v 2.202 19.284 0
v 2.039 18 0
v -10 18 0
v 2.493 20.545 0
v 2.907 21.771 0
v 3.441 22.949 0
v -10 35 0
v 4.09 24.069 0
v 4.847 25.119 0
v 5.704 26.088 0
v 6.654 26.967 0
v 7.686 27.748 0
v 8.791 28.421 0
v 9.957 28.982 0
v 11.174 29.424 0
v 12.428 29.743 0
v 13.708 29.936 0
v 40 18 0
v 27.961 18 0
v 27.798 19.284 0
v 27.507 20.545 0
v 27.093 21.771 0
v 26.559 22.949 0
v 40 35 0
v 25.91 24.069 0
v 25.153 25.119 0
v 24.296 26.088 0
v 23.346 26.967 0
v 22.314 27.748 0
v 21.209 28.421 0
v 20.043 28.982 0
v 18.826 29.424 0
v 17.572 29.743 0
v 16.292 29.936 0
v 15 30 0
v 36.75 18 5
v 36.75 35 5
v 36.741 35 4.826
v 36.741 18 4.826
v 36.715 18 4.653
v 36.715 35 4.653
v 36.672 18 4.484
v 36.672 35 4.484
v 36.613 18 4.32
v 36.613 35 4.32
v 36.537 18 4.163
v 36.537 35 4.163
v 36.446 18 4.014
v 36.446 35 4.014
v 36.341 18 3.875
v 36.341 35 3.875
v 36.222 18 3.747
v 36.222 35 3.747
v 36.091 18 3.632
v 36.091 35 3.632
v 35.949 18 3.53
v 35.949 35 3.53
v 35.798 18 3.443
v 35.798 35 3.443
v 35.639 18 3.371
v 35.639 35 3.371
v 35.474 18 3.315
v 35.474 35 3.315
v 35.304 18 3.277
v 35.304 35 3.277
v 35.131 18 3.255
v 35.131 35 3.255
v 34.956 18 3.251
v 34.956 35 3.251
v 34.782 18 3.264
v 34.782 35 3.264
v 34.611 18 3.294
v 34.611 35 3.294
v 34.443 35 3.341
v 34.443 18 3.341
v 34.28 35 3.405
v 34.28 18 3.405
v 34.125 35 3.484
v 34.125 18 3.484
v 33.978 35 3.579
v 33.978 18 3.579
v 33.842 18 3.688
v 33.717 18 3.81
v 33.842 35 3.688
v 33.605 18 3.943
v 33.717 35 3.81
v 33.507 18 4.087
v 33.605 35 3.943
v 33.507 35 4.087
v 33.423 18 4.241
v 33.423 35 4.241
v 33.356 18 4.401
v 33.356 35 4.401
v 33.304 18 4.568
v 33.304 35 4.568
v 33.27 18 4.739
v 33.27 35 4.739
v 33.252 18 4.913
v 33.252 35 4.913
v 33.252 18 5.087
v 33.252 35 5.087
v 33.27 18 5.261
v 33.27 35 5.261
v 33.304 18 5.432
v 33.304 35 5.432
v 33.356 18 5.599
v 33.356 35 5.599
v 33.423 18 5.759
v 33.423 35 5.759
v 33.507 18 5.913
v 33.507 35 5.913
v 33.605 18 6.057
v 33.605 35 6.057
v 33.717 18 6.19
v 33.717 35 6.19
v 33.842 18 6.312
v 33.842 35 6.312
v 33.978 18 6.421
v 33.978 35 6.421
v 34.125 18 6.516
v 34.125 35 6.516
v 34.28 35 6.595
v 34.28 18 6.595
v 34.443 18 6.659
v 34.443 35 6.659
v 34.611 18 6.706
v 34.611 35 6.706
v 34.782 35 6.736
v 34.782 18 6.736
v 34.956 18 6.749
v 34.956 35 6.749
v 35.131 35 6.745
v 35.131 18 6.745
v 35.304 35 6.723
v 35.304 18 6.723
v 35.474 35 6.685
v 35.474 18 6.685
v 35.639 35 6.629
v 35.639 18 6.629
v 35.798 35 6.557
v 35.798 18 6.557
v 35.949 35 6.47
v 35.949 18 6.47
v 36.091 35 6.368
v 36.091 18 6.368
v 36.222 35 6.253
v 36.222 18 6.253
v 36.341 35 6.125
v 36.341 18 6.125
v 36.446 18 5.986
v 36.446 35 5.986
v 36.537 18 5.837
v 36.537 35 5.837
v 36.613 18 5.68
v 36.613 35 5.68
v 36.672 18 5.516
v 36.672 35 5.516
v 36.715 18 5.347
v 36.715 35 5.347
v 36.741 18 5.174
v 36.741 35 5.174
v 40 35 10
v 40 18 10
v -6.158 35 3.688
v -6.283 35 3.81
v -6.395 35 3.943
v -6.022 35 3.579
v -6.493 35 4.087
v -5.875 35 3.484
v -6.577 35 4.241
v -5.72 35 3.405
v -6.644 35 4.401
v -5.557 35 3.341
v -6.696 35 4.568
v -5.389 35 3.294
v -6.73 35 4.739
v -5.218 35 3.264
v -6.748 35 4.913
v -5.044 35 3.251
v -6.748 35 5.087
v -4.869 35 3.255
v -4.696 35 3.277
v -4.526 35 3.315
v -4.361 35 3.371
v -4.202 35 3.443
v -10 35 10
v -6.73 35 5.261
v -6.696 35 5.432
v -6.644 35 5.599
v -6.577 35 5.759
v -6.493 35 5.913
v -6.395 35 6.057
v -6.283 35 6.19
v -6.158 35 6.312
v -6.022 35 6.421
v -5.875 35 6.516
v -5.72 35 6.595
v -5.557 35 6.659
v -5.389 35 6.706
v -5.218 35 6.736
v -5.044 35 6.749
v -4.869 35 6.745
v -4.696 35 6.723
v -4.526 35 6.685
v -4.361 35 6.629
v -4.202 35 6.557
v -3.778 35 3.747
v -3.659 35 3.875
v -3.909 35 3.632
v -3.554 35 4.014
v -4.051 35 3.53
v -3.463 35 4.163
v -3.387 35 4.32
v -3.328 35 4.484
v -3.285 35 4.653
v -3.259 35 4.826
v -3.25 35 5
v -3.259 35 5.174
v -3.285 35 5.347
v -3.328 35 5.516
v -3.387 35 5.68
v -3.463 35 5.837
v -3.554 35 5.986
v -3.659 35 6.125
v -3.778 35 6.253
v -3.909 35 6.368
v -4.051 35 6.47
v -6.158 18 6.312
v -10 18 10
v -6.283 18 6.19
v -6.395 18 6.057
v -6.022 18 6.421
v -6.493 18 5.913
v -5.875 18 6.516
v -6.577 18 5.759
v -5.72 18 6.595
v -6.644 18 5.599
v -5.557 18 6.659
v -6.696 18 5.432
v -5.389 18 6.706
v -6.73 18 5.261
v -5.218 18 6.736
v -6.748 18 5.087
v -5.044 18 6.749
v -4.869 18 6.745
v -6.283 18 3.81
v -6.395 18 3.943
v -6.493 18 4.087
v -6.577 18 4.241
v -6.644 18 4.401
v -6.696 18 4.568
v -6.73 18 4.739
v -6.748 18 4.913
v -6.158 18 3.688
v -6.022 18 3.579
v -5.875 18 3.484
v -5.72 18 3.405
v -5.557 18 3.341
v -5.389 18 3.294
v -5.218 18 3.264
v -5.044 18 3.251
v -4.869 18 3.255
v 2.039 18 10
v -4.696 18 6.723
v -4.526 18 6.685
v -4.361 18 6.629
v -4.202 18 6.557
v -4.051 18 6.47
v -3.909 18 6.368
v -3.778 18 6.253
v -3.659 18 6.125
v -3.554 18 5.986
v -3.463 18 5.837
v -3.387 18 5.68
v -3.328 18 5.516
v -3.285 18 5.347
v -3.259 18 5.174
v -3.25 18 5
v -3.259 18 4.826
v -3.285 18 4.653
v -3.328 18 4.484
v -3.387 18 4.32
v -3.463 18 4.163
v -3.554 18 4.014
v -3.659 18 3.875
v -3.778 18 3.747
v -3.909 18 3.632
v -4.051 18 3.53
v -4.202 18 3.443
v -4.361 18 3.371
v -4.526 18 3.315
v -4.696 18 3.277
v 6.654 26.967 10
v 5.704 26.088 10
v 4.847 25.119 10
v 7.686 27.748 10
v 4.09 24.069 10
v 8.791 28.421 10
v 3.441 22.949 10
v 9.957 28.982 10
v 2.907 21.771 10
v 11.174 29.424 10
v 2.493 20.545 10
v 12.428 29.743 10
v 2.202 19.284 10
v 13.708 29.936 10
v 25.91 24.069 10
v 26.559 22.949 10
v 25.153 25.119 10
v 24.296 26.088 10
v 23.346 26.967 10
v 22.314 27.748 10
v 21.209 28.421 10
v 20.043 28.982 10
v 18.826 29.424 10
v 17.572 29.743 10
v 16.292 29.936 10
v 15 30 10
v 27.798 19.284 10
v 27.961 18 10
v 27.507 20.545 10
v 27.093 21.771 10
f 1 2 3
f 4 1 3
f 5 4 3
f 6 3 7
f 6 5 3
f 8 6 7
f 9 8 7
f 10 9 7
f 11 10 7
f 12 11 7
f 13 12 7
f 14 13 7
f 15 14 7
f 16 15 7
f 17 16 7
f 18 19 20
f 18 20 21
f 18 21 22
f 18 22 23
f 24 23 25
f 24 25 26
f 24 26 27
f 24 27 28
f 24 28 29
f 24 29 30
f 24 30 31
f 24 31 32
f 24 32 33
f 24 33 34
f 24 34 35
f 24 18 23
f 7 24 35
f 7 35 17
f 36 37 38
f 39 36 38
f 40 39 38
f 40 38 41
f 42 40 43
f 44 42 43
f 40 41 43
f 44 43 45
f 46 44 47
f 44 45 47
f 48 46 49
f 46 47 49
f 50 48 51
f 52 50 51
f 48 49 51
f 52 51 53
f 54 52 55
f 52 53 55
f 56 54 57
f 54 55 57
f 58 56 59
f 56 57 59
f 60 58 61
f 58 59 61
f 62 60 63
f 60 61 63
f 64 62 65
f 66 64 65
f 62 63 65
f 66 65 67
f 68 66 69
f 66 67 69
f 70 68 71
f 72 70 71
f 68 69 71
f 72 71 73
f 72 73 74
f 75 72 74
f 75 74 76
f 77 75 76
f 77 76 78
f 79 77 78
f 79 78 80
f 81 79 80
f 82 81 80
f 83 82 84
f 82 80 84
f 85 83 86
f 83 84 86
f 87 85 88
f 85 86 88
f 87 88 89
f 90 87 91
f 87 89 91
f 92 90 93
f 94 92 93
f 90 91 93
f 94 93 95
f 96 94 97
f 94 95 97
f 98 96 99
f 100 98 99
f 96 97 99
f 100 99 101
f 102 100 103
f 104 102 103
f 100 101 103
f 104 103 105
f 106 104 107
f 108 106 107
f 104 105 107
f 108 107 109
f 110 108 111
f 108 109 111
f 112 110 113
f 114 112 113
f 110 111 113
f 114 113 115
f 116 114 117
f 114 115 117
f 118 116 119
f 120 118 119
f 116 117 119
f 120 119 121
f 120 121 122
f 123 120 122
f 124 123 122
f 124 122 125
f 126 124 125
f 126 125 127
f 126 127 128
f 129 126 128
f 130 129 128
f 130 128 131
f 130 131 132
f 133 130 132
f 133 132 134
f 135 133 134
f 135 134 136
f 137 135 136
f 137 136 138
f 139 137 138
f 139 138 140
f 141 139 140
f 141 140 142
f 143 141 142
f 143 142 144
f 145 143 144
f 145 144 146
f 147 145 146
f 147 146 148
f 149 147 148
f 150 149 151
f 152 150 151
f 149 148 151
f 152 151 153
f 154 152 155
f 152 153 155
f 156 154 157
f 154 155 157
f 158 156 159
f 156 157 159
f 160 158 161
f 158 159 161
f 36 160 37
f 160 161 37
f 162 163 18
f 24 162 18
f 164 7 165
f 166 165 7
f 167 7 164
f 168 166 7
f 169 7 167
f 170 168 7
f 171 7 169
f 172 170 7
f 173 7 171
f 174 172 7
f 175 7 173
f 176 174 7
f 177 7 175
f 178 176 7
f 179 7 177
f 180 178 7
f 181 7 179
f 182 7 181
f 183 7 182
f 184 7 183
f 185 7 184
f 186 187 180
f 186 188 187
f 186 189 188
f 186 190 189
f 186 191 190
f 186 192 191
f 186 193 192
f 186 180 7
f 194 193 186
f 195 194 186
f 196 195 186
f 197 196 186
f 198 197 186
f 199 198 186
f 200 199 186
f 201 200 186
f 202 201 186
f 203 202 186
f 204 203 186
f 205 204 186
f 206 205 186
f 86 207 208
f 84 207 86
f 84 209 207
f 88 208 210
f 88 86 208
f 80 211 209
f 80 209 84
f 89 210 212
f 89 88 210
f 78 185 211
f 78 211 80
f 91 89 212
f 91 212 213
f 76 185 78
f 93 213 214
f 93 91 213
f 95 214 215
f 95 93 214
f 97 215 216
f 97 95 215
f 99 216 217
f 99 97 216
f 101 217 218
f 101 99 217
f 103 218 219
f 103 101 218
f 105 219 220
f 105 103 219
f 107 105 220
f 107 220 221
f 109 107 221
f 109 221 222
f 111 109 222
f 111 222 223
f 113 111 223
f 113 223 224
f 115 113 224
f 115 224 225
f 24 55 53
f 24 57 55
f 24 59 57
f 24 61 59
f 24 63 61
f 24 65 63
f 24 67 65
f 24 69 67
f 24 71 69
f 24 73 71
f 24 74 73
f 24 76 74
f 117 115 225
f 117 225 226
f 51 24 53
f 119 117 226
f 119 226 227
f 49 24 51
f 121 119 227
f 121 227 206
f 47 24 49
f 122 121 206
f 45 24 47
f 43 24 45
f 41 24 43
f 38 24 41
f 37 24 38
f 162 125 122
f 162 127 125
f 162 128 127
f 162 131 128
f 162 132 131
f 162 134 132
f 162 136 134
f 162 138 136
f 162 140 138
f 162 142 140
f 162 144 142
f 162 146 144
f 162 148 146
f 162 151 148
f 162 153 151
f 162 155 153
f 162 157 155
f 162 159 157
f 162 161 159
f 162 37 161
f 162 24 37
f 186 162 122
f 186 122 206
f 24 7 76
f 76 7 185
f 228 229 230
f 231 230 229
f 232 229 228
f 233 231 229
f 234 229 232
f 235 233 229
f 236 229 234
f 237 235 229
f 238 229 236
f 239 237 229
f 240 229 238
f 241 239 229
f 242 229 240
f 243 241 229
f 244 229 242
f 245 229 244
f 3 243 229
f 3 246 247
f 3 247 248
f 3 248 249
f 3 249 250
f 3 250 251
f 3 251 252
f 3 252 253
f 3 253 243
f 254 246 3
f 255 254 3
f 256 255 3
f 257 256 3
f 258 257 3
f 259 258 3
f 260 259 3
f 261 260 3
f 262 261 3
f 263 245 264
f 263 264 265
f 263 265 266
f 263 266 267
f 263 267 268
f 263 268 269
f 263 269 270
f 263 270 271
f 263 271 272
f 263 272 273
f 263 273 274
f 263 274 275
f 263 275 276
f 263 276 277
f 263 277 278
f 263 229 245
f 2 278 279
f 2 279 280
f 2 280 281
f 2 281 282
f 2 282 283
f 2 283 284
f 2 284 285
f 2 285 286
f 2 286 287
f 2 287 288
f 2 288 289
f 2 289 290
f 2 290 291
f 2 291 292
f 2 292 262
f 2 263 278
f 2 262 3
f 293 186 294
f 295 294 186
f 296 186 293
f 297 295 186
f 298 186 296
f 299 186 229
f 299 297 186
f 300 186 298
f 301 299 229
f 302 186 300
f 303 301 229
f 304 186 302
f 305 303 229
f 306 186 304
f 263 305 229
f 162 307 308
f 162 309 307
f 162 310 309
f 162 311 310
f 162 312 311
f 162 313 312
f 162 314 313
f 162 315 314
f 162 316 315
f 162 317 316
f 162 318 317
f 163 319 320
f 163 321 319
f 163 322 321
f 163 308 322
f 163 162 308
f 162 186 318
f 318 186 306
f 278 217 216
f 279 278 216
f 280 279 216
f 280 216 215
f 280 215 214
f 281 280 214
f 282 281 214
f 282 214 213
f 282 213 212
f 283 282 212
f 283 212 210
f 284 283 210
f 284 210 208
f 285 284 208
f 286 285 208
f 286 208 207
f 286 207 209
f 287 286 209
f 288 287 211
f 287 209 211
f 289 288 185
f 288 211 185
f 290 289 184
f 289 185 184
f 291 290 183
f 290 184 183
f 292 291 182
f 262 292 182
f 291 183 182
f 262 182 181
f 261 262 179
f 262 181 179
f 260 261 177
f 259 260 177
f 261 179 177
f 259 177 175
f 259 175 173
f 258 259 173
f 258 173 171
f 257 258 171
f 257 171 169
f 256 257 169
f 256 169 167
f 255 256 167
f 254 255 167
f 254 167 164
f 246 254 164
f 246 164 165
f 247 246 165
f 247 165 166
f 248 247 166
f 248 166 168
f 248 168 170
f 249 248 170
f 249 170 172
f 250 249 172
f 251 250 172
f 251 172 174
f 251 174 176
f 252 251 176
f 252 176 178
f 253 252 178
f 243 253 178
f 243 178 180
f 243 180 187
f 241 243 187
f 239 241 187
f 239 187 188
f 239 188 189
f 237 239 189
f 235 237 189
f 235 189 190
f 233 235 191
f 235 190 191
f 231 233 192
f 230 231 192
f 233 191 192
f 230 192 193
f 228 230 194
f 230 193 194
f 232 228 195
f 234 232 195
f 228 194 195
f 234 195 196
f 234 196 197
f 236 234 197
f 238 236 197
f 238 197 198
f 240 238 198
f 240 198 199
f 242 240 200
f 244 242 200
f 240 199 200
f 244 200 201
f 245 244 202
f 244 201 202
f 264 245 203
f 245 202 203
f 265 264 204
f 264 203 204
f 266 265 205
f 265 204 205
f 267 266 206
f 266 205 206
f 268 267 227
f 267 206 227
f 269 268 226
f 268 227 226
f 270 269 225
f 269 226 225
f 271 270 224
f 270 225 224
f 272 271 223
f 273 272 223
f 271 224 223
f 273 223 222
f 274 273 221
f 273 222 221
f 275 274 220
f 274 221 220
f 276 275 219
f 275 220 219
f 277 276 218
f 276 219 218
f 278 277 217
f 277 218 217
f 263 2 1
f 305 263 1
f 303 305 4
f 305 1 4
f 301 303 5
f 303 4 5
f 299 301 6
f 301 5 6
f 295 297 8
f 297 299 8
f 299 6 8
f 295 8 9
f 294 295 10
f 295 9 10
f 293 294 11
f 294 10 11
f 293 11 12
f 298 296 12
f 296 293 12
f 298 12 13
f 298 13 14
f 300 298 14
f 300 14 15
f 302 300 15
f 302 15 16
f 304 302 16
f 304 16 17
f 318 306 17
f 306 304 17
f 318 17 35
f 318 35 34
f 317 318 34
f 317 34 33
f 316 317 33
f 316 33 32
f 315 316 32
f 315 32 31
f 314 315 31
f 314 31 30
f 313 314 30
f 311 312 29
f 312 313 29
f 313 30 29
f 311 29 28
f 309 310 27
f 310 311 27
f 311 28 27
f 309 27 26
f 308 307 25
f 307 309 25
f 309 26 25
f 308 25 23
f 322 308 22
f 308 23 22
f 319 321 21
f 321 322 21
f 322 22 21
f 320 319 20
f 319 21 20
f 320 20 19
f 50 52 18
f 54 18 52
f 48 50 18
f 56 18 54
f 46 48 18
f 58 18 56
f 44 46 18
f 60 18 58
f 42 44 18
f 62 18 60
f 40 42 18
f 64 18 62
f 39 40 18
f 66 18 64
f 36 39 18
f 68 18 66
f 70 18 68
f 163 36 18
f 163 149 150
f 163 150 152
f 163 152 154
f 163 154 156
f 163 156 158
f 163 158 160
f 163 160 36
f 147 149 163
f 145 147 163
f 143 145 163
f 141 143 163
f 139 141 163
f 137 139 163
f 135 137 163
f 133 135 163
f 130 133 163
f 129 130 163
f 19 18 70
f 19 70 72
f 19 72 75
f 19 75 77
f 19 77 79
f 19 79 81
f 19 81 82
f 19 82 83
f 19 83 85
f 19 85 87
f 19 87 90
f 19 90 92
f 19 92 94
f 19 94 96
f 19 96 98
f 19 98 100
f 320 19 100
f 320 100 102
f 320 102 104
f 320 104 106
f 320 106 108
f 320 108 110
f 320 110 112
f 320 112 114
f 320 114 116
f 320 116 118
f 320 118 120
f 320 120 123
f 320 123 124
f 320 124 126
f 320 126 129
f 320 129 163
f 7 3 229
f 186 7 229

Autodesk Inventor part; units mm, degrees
ref_plane "YZ Plane" through (0, 0, 0) normal (1, 0, 0) x (0, 1, 0)
ref_plane "XZ Plane" through (0, 0, 0) normal (0, 1, 0) x (-1, 0, 0)
ref_plane "XY Plane" through (0, 0, 0) normal (0, 0, 1) x (1, 0, 0)
sketch "Sketch1" plane through (0, 0, 0) normal (0, 0, 1) x (1, 0, 0)
  line L0 (0, 0) -> (30, 0)
  line L1 (30, 0) -> (30, 35)
  line L2 (30, 35) -> (0, 35)
  line L3 (0, 35) -> (0, 0)
  circle A0 centre (15, 17) radius 13
  dimension "d0" = 30
  dimension "d1" = 35
  dimension "d2" = 26
  dimension "d3" = 15
  dimension "d4" = 18
extrude "Extrusion1" add sketch "Sketch1" along normal blind 10
sketch "Sketch4" plane through (30, 0, 0) normal (1, 0, 0) x (0, 0, -1)
  line L0 (0, 0) -> (-10, 0) projected
  line L1 (0, 0) -> (0, 35) projected
  line L2 (-10, 0) -> (0, 0)
  line L3 (0, 0) -> (0, 18)
  line L4 (0, 18) -> (-10, 18)
  line L5 (-10, 18) -> (-10, 0)
  dimension "d25" = 18
extrude "Extrusion2" cut sketch "Sketch4" against normal through all
sketch "Sketch5" plane through (30, 35, 10) normal (1, 0, 0) x (0, 0, -1)
  line L0 (10, 0) -> (10, -17) projected
  line L1 (0, 0) -> (0, -17) projected
  line L2 (10, -17) -> (0, -17)
  line L3 (0, -17) -> (0, 0)
  line L4 (0, 0) -> (10, 0)
  line L5 (10, 0) -> (10, -17)
  point P0 (10, -35)
extrude "Extrusion3" add sketch "Sketch5" along normal blind 10
sketch "Sketch6" plane through (0, 35, 0) normal (-1, 0, 0) x (0, 0, 1)
  line L0 (0, -17) -> (0, 0) projected
  line L1 (10, -17) -> (0, -17)
  line L2 (0, -17) -> (0, 0)
  line L3 (0, 0) -> (10, 0)
  line L4 (10, 0) -> (10, -17)
  point P0 (0, -35)
extrude "Extrusion4" add sketch "Sketch6" along normal blind 10
sketch "Sketch7" plane through (40, 35, 10) normal (0, 1, 0) x (1, 0, 0)
  circle A0 centre (-45, 5) radius 1.75
  circle A1 centre (-5, 5) radius 1.75
  line L0 (-50, 0) -> (-50, 10) projected
  line L1 (-50, 10) -> (0, 10) projected
  line L2 (0, 10) -> (0, 0) projected
  point P0 (-40, 10)
  dimension "d32" = 3.5
  dimension "d33" = 3.5
  dimension "d34" = 5
  dimension "d35" = 5
  dimension "d36" = 5
  dimension "d37" = 5
extrude "Extrusion5" cut sketch "Sketch7" against normal through all
properties part number "motortarto" material "ABS Plastic"
